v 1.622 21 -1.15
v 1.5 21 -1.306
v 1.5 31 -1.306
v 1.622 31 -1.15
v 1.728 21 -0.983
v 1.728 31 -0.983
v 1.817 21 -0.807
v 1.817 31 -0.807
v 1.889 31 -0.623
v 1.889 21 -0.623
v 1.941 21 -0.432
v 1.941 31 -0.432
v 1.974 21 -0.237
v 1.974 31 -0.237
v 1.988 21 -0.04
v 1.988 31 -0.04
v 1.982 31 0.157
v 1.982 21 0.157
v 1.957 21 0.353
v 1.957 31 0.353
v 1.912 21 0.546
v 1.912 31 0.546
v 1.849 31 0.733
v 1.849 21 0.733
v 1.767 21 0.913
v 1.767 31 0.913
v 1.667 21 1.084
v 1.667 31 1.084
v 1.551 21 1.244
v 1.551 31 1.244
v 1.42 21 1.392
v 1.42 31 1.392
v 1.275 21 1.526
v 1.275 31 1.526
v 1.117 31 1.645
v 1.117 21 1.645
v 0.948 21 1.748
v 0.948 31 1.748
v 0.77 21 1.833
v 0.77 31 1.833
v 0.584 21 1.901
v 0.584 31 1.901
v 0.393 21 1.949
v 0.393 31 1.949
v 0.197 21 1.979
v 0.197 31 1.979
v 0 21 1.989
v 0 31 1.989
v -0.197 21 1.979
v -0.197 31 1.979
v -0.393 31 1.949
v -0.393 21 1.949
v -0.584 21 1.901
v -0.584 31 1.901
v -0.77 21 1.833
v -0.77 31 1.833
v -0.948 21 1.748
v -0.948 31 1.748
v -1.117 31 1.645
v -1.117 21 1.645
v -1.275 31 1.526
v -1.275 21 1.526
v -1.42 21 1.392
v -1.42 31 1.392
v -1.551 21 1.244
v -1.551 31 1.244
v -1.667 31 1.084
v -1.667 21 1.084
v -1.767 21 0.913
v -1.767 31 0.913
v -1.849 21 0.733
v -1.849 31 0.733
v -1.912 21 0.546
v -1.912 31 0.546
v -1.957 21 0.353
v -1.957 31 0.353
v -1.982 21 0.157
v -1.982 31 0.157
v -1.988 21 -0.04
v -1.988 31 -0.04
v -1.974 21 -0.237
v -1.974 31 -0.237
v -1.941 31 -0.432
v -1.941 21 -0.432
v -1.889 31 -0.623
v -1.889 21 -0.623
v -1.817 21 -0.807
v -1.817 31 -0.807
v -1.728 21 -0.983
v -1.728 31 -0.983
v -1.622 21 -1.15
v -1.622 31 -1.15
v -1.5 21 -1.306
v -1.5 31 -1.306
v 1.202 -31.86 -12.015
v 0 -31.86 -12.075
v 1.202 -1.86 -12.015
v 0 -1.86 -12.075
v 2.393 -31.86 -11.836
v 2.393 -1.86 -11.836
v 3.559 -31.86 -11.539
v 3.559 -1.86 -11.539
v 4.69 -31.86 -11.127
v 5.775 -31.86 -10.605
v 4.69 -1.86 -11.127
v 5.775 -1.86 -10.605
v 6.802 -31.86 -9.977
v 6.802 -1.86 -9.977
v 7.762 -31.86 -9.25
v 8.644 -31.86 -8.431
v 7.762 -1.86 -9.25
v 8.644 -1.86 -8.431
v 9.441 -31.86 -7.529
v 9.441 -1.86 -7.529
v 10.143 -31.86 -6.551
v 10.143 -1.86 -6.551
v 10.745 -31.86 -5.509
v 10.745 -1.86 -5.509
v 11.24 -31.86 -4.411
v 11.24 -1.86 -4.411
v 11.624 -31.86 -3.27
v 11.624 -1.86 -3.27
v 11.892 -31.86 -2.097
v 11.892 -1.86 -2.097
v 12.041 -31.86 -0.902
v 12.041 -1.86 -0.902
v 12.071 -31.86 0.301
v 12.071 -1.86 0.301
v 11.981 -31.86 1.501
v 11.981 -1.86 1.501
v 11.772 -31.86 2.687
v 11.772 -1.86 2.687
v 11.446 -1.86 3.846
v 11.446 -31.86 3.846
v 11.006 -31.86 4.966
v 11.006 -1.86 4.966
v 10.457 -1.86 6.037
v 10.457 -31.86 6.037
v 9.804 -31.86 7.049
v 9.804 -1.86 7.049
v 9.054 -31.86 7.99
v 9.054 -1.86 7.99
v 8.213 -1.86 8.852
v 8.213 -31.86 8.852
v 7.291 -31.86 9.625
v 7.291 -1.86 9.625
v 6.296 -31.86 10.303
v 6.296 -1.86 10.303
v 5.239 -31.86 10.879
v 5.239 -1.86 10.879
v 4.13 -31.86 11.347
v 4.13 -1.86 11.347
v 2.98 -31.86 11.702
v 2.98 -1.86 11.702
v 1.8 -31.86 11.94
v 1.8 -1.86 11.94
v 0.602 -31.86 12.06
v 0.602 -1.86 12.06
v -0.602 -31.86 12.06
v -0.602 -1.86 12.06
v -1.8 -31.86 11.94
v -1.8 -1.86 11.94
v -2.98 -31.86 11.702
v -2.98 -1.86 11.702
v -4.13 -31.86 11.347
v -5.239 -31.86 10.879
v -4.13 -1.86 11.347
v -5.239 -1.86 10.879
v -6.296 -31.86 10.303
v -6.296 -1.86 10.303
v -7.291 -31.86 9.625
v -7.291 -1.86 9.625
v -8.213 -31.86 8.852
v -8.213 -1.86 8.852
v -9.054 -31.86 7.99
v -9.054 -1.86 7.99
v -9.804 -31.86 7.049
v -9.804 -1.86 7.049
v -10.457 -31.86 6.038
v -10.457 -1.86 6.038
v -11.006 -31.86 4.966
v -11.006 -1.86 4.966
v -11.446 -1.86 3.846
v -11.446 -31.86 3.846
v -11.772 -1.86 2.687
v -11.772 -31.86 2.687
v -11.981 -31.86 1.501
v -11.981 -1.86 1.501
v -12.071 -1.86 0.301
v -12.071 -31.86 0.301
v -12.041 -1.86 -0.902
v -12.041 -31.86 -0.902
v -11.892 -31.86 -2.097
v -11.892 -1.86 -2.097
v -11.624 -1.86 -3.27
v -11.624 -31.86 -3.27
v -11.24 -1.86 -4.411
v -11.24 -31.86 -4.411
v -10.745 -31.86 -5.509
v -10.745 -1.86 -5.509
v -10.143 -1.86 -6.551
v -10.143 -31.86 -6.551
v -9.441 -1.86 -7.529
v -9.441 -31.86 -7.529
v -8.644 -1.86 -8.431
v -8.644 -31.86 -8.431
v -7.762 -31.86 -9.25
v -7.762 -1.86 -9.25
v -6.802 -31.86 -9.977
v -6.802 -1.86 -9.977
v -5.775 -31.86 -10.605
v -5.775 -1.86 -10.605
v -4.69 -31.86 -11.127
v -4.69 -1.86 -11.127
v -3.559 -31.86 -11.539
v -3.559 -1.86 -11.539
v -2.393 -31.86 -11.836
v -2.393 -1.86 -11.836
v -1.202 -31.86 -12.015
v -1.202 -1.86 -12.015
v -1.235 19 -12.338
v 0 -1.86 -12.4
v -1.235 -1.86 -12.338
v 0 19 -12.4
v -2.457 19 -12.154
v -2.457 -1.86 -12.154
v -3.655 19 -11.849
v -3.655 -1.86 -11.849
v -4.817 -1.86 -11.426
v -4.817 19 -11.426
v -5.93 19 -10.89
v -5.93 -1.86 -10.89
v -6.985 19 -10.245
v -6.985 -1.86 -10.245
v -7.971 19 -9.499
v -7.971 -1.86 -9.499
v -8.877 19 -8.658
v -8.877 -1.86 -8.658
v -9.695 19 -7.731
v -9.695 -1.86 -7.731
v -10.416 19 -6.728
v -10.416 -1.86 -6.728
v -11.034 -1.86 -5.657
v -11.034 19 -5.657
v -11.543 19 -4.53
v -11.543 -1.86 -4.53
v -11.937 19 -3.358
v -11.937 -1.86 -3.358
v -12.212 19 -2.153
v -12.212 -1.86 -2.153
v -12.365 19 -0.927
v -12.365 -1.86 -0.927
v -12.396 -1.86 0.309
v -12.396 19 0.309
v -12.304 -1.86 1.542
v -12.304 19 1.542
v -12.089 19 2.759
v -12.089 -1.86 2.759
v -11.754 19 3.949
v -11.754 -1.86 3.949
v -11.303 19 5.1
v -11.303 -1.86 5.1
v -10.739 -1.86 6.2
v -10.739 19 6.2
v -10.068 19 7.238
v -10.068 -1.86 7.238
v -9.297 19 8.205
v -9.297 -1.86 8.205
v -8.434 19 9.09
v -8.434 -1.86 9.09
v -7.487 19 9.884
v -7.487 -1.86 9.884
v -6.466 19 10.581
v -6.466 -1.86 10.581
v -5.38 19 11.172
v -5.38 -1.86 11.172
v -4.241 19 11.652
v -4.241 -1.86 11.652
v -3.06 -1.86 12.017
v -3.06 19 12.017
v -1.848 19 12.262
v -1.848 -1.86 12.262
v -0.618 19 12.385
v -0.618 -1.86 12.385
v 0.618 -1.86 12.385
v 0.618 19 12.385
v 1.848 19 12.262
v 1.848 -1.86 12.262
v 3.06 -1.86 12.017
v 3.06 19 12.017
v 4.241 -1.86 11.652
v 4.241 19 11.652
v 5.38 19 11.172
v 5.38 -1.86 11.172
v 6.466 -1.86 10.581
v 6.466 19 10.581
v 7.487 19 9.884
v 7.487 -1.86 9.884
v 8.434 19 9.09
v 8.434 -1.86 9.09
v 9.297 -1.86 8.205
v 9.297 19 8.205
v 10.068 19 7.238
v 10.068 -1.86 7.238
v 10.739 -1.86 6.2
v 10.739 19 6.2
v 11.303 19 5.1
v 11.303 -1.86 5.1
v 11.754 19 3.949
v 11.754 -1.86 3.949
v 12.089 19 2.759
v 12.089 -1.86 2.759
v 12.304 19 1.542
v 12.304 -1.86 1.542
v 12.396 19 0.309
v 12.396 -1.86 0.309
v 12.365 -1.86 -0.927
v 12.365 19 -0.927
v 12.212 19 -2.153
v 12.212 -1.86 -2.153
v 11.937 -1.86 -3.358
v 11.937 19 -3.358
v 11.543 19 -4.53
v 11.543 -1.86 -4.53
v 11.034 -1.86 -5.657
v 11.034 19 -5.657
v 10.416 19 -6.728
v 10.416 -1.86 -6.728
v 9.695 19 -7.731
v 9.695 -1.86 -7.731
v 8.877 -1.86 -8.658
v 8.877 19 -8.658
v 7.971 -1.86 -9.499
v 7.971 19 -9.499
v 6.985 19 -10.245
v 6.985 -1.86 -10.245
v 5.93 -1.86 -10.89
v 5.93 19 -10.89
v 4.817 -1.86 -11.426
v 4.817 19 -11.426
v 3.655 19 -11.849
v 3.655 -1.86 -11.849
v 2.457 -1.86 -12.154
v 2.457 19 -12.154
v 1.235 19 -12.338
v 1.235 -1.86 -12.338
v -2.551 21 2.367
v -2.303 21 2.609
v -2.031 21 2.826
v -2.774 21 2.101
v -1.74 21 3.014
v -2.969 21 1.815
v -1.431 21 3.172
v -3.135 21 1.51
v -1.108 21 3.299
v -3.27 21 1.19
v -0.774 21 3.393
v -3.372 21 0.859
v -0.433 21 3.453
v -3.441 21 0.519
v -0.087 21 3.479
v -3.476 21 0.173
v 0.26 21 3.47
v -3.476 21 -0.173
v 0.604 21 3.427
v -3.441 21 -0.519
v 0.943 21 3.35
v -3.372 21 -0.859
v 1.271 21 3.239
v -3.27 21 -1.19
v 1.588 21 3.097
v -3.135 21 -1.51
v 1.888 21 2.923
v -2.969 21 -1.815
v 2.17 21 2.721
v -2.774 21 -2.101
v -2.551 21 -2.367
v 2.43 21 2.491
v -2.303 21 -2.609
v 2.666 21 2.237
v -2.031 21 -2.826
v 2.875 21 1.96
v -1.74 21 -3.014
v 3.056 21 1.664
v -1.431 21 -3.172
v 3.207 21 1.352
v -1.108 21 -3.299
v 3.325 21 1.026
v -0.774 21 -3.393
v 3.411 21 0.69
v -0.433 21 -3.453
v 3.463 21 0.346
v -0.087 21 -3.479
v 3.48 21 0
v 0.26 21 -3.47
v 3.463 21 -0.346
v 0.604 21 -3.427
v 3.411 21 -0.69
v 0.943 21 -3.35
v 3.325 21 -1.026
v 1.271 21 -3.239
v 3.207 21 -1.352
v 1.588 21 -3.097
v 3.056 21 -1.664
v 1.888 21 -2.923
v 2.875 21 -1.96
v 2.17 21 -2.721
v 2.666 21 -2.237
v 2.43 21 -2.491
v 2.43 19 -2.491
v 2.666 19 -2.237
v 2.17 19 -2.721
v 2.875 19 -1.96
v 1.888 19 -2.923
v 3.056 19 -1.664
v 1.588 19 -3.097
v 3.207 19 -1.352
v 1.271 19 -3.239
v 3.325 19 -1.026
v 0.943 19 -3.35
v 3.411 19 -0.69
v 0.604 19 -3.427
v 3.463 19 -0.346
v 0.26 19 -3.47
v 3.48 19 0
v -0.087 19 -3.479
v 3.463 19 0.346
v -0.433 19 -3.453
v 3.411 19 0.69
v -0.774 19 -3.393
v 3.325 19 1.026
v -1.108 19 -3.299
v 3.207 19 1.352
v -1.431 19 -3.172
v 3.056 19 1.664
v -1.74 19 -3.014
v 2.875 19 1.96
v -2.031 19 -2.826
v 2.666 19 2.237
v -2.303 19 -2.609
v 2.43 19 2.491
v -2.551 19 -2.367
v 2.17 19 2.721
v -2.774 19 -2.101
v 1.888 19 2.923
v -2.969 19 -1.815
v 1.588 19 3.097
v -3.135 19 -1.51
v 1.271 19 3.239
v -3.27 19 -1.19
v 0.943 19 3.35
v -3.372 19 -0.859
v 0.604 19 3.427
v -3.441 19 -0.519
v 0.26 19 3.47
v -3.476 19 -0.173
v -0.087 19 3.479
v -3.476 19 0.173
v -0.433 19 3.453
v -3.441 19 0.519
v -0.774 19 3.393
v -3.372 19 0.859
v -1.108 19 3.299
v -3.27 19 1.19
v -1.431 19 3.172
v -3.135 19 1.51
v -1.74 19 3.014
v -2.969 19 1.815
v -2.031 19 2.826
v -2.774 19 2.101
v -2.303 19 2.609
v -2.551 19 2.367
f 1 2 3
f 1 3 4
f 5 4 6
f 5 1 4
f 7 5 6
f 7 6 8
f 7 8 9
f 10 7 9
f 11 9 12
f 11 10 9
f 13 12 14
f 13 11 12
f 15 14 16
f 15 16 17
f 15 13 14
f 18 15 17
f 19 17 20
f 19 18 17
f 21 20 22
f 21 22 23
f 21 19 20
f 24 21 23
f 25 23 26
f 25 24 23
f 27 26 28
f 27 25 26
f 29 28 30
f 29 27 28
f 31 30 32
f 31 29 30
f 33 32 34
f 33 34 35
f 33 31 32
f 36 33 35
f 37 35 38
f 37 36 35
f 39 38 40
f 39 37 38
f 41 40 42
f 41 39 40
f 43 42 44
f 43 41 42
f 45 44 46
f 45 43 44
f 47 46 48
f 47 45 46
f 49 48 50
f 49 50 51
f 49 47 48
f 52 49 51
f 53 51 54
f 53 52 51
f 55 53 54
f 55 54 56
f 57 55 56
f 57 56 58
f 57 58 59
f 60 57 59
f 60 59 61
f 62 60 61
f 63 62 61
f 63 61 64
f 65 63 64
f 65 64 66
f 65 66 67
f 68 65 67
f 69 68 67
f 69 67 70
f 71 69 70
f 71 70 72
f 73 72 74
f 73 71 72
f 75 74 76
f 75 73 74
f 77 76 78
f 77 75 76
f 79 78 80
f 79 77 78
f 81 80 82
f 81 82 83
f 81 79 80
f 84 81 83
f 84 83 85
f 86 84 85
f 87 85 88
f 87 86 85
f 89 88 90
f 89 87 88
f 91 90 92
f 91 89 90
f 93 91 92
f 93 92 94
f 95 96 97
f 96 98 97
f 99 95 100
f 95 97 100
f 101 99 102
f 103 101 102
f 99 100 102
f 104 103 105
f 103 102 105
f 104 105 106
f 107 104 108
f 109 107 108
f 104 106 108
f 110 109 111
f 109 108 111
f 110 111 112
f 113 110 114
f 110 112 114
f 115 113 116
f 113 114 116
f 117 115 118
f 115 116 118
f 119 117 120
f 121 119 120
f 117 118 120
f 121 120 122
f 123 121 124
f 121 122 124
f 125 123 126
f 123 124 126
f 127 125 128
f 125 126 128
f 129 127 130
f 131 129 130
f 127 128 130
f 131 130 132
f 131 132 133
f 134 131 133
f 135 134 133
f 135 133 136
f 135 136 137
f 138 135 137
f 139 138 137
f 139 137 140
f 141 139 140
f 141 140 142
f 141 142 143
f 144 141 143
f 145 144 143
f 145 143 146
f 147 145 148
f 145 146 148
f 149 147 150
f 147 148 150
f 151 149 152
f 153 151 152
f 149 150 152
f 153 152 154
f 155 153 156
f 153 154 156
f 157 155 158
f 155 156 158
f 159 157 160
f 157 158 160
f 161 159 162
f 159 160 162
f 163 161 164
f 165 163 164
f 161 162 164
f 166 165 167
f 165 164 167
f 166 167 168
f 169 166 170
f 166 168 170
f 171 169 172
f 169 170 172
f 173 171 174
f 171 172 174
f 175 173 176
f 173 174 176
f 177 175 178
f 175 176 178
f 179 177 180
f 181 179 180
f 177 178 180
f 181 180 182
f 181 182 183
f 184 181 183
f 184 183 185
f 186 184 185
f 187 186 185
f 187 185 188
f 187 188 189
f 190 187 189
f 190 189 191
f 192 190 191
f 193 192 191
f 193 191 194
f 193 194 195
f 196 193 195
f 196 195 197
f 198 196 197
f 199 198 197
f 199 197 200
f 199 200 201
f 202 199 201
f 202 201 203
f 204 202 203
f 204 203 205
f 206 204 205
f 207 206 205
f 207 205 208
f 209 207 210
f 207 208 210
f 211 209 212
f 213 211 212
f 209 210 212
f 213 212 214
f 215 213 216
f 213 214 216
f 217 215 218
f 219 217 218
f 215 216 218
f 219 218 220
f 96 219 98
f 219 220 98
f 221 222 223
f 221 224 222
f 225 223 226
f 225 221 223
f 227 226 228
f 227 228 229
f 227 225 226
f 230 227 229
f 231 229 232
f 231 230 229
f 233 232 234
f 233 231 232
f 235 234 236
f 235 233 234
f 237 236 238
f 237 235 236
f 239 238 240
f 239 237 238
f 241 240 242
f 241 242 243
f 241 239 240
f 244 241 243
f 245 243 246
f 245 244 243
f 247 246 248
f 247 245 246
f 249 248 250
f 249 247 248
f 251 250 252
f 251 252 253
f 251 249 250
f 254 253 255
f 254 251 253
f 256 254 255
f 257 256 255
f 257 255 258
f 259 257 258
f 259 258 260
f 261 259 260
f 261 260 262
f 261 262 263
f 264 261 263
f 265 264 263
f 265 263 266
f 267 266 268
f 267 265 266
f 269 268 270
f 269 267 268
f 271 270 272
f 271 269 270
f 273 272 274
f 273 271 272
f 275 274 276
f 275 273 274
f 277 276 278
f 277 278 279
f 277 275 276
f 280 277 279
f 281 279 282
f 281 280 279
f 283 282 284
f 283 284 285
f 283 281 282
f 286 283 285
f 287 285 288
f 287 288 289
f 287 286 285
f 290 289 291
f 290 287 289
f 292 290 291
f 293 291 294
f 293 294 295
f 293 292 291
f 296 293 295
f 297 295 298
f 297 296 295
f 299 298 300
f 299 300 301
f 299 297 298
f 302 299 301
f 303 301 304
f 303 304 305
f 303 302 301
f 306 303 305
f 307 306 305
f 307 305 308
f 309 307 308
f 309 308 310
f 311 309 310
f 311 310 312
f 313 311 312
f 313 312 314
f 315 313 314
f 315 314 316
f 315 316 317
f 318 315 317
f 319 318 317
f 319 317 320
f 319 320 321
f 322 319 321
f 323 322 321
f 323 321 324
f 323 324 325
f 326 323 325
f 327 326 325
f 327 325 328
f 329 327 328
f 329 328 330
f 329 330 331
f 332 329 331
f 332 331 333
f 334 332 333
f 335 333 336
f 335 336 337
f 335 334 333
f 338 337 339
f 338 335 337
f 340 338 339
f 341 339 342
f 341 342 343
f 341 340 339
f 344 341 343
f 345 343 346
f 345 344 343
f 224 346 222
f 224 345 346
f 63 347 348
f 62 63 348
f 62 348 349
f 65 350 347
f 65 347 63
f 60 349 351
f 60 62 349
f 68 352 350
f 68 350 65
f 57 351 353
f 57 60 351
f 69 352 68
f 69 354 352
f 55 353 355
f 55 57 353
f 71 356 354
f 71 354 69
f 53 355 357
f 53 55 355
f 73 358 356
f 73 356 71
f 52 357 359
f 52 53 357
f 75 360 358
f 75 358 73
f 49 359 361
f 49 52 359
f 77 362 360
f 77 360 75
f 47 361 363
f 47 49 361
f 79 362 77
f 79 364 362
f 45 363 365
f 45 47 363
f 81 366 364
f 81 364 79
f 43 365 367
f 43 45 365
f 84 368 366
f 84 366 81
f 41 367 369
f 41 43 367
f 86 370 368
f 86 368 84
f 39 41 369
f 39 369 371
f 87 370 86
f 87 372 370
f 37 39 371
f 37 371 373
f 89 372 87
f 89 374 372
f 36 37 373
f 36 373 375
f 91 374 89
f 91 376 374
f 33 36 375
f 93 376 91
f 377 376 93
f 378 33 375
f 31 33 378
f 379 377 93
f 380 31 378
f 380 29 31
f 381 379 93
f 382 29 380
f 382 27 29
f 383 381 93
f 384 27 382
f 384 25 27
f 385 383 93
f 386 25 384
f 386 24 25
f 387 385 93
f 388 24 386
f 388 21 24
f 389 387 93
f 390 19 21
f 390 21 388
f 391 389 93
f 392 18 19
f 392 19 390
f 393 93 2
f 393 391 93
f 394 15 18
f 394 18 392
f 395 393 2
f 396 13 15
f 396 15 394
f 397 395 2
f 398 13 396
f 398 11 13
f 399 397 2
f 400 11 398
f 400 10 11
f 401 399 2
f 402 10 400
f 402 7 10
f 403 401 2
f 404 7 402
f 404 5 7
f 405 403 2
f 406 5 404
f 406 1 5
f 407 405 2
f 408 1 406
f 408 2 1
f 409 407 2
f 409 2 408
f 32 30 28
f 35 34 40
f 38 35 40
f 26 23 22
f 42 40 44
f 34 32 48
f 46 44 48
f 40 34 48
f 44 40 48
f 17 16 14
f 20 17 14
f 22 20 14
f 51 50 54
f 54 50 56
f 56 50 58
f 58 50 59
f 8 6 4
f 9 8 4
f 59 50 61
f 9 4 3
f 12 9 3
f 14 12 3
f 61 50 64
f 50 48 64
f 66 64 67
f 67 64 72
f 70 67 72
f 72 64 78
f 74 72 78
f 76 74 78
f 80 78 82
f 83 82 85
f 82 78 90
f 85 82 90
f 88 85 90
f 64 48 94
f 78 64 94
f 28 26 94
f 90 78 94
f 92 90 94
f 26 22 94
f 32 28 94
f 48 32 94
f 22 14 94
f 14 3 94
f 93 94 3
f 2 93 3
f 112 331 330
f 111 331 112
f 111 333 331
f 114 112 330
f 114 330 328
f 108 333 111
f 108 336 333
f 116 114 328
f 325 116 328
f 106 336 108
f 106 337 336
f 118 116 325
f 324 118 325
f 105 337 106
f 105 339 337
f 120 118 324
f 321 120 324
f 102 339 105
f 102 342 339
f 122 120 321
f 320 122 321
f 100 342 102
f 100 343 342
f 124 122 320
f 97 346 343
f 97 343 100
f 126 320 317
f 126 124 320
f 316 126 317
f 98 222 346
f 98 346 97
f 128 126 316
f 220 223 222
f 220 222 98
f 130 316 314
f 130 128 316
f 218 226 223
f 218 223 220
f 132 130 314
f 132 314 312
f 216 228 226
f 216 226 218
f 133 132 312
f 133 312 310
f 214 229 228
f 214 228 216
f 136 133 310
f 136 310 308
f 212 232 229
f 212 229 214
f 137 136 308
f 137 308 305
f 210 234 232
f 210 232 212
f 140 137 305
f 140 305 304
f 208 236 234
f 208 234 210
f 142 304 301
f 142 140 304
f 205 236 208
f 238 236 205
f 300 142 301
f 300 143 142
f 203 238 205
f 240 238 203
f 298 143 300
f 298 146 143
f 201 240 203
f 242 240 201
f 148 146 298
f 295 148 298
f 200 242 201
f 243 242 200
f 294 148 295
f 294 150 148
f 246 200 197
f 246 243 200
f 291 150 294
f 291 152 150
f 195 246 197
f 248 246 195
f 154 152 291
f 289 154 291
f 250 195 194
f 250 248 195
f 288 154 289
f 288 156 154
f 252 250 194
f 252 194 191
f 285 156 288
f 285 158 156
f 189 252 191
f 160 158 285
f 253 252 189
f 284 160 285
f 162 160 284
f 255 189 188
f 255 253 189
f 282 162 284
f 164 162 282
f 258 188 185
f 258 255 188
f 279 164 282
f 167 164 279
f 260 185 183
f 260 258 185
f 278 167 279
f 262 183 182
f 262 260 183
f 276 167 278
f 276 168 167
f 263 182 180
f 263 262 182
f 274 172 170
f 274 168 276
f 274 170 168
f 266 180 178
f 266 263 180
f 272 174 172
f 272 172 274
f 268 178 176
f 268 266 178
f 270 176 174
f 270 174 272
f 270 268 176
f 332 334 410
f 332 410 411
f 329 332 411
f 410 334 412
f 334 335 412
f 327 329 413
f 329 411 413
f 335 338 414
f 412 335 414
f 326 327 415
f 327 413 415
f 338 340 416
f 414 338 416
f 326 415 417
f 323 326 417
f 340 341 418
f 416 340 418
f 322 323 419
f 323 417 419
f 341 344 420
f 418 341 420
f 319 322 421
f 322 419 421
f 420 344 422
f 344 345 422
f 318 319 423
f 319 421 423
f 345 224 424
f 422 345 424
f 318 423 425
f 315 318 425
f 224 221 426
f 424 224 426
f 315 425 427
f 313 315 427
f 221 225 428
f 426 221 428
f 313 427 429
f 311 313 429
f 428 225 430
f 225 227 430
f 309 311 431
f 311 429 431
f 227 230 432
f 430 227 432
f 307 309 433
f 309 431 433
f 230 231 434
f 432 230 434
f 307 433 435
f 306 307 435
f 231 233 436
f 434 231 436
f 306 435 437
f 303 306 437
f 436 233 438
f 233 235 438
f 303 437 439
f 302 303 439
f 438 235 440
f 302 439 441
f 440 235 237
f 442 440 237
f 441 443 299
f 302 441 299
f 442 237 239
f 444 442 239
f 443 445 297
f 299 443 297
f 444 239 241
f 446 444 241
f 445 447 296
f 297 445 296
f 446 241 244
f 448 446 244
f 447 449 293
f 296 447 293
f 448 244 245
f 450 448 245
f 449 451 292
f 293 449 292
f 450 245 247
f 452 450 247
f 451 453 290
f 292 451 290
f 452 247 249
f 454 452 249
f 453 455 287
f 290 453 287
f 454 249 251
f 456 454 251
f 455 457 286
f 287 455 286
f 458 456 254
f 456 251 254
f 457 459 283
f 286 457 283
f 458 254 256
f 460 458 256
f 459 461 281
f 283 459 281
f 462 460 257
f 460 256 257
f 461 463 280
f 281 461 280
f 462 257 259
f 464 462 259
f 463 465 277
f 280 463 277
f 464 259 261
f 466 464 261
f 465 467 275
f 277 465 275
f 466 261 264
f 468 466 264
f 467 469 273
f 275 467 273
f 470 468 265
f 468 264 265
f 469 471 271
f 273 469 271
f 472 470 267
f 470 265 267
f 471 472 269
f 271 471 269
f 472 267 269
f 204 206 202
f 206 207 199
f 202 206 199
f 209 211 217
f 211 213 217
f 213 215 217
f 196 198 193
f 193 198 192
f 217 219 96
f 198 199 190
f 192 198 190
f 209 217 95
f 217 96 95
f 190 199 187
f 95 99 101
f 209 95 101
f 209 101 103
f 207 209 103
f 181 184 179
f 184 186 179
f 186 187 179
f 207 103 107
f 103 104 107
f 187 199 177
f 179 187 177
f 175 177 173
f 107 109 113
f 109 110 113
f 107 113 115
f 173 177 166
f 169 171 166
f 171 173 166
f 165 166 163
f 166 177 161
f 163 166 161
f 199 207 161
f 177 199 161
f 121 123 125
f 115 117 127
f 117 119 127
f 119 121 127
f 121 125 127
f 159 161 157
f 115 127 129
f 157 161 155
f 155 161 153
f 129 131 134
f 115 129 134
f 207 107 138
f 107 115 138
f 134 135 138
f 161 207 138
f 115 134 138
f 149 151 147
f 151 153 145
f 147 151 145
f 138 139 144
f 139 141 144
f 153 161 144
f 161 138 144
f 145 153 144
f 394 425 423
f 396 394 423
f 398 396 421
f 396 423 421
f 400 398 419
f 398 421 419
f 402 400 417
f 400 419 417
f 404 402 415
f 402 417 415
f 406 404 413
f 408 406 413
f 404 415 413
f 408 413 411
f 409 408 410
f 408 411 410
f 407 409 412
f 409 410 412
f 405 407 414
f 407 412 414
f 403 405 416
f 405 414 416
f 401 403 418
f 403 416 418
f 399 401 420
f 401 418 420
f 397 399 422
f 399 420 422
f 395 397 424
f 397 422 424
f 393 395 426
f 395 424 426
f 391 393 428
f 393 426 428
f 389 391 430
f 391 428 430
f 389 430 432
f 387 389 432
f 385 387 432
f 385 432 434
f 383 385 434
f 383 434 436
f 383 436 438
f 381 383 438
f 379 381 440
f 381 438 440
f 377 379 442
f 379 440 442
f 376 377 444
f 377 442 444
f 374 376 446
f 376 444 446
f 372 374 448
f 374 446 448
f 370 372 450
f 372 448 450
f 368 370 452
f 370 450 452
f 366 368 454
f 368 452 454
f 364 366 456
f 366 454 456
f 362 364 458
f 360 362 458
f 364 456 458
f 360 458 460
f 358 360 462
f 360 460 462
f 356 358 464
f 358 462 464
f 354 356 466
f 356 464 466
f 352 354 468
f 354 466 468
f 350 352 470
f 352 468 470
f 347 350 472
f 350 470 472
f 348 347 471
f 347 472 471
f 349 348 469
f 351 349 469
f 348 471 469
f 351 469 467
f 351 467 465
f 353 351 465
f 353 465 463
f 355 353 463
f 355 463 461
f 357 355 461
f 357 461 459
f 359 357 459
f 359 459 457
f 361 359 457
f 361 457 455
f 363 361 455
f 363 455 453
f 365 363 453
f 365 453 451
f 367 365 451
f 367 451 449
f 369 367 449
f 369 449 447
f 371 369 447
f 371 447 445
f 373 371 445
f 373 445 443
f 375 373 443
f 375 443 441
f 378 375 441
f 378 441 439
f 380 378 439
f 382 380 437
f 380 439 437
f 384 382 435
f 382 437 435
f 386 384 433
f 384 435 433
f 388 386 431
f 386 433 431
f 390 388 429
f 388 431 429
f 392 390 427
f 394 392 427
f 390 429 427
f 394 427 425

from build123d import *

# Parameters (mm, degrees)
SKETCH1_W           = 12.075
SKETCH1_H           = 30
SKETCH2_W           = 12.4
SKETCH2_H           = 20.86
SKETCH3_R           = 3.48
BOSS_EXTRUDE1_DEPTH = 2
BOSS_EXTRUDE2_DEPTH = 10


with BuildPart() as part:
    # Sketch1 → Revolve1 (revolve)
    with BuildSketch(Plane(origin=(0, 0, 0), x_dir=(0, 0, -1), z_dir=(1, 0, 0))):
        with Locations((6.0375, -16.859504132)):
            Rectangle(SKETCH1_W, SKETCH1_H)
    revolve(axis=Axis((0, 44.256198347, 0), (0, -1, 0)))

    # Sketch2 → Revolve2 (revolve)
    with BuildSketch(Plane(origin=(0, 0, 0), x_dir=(0, 0, -1), z_dir=(1, 0, 0))):
        with Locations((6.2, 8.570495868)):
            Rectangle(SKETCH2_W, SKETCH2_H)
    revolve(axis=Axis((0, -1.859504132, 0), (0, 1, 0)))

    # Sketch3 → Boss-Extrude1 (add)
    with BuildSketch(Plane(origin=(0, 19.000495868, 0), x_dir=(1, 0, 0), z_dir=(0, 1, 0))):
        Circle(SKETCH3_R)
    extrude(amount=BOSS_EXTRUDE1_DEPTH)

    # Sketch4 → Boss-Extrude2 (add)
    with BuildSketch(Plane(origin=(0, 21.000495868, 0), x_dir=(1, 0, 0), z_dir=(0, 1, 0))):
        with BuildLine():
            Line((-1.5, 1.305560373), (1.5, 1.305560373))
            ThreePointArc((1.5, 1.305560373), (0, -1.988589421), (-1.5, 1.305560373))
        make_face()
    extrude(amount=BOSS_EXTRUDE2_DEPTH)


solid = part.part
